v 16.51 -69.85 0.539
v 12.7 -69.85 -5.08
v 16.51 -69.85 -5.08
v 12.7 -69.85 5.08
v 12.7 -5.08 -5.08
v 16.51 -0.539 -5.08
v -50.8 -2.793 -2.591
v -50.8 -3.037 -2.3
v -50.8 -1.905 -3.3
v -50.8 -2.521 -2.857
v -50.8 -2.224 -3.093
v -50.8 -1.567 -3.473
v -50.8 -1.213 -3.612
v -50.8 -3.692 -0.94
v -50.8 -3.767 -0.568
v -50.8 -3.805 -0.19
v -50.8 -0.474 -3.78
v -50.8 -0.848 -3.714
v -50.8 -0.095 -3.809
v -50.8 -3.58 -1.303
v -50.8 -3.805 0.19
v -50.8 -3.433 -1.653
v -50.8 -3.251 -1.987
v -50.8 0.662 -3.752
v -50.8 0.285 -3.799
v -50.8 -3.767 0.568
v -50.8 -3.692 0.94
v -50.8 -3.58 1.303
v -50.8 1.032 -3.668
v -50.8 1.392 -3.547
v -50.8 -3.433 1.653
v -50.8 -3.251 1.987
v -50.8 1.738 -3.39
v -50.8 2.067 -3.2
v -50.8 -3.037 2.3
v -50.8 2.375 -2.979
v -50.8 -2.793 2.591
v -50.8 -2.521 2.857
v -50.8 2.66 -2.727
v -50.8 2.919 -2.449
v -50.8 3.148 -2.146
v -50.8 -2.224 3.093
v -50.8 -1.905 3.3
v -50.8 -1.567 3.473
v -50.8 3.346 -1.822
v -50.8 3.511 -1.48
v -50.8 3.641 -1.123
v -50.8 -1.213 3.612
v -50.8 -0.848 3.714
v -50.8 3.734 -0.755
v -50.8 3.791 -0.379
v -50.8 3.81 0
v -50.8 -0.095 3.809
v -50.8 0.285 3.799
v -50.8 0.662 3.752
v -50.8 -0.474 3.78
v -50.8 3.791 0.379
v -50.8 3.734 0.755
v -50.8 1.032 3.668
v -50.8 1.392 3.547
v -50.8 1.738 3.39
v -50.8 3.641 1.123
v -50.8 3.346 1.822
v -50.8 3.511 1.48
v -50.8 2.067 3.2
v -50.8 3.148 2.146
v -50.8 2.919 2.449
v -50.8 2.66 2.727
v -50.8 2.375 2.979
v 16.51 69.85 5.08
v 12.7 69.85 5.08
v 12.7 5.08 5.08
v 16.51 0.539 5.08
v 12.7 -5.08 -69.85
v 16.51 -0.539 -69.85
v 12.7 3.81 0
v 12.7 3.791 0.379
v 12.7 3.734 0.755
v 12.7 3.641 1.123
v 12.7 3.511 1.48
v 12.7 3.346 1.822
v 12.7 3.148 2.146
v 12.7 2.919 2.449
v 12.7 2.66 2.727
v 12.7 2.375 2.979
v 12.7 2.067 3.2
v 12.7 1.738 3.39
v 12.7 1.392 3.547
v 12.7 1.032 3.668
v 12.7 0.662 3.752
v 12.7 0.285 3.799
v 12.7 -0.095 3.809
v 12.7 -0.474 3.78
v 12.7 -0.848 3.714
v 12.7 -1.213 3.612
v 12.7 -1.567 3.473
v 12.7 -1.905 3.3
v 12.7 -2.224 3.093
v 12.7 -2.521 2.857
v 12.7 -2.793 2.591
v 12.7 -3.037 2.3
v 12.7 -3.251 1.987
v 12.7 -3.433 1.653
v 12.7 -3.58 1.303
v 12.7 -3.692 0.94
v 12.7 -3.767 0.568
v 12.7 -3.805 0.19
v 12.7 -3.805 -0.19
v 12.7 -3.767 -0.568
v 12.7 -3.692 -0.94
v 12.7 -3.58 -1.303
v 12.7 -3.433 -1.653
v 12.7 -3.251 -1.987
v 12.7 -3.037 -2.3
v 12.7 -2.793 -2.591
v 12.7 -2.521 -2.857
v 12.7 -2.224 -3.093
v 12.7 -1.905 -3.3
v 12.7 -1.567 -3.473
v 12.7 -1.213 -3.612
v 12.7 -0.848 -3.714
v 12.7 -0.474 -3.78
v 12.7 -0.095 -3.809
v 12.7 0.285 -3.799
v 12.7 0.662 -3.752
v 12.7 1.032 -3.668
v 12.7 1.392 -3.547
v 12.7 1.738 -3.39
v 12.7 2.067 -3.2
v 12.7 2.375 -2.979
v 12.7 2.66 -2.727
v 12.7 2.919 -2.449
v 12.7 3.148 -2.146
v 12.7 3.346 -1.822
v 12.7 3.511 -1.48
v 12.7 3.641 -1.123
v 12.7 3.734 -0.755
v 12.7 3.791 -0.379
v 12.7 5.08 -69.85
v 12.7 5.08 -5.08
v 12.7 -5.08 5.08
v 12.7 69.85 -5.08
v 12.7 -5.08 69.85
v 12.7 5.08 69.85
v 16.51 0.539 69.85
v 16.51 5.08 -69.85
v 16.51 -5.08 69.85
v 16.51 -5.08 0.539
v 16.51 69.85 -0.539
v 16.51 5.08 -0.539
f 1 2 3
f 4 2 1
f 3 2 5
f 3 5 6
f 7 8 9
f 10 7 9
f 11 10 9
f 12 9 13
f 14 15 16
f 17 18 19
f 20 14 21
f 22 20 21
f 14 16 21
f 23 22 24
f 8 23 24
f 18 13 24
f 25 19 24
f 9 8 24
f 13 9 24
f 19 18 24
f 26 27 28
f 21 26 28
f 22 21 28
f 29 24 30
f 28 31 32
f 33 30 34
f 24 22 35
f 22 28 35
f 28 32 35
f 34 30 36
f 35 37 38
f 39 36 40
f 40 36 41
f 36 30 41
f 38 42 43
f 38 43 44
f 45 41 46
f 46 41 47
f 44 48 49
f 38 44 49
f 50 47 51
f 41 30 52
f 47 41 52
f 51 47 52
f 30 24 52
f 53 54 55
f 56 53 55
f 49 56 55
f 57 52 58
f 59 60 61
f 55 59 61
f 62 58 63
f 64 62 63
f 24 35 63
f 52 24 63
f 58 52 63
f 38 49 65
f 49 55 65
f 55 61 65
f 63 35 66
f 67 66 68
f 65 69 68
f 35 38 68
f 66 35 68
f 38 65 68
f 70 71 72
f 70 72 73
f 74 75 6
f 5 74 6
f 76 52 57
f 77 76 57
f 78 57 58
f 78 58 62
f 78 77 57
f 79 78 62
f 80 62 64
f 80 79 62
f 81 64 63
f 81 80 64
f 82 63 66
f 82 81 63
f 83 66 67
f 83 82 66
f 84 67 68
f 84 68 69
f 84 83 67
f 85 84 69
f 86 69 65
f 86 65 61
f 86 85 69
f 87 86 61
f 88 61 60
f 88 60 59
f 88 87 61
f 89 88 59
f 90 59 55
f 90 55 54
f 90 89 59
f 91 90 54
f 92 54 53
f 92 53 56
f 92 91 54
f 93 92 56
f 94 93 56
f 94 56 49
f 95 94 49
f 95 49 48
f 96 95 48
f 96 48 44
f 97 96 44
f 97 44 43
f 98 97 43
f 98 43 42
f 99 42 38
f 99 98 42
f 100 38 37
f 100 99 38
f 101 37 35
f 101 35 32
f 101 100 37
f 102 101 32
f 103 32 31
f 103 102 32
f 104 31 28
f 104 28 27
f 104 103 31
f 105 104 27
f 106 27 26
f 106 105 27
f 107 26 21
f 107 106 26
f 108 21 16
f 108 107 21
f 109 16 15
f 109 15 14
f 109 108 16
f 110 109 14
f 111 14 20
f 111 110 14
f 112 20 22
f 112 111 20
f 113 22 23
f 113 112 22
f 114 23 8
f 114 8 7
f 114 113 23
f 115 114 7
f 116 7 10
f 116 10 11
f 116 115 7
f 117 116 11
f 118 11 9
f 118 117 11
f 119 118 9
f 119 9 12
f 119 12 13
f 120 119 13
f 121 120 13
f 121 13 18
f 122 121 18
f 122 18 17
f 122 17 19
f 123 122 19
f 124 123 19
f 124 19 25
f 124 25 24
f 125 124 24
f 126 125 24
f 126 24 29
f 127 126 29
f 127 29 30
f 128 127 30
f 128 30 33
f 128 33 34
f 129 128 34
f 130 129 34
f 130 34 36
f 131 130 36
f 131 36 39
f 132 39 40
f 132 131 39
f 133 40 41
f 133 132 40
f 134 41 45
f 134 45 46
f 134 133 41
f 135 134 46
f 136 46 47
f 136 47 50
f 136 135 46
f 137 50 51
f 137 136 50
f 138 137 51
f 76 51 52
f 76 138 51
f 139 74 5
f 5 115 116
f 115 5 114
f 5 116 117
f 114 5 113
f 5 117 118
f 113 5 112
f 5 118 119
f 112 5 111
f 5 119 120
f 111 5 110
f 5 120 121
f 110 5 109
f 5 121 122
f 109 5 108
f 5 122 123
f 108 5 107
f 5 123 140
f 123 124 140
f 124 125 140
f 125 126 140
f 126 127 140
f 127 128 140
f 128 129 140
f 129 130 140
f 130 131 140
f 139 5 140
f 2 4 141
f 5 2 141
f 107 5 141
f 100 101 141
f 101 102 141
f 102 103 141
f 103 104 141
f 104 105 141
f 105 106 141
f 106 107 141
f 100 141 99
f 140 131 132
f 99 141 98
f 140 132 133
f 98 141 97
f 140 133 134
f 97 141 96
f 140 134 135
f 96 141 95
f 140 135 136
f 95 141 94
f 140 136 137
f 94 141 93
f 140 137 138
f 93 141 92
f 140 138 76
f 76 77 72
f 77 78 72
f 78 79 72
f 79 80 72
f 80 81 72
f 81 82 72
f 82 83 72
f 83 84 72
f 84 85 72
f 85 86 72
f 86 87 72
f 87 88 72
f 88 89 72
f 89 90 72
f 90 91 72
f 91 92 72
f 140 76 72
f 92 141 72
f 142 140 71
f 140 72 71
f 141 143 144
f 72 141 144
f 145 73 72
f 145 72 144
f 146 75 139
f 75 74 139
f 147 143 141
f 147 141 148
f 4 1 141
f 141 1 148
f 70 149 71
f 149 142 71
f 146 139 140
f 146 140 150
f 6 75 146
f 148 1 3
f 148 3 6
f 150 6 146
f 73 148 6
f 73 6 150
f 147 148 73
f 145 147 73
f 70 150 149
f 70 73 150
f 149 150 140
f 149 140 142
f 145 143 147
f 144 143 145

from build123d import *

# Parameters (mm, degrees)
F0_R          = 3.81
F1_DEPTH      = 12.7
F1_DEPTH_BACK = 50.8
F2_W          = 64.77
F2_H          = 10.16
F2_W_2        = 10.16
F2_H_2        = 64.77
F3_DEPTH      = 3.81
F4_SIZE2      = 4.540571
F4_SIZE       = 3.80999
F4_2_SIZE2    = 4.540571
F4_2_SIZE     = 3.80999
F4_3_SIZE2    = 4.540571
F4_3_SIZE     = 3.80999
F4_4_SIZE2    = 4.540571
F4_4_SIZE     = 3.80999


# Not quite as in the source:
# - a fillet or chamfer is up to 0.001 mm smaller than in the source, because OpenCascade refuses the exact size


with BuildPart() as f1:
    # F0 (on Right) → F1 (new body, two sides)
    with BuildSketch(Plane.YZ) as f1_sk:
        Circle(F0_R)
    extrude(amount=F1_DEPTH)
    extrude(f1_sk.sketch, amount=-F1_DEPTH_BACK)

    # F2 (on face) → F3 (join)
    with BuildSketch(Plane.YZ.offset(12.7)):
        with Locations((37.465, 0)):
            Rectangle(F2_W, F2_H)
        Rectangle(F2_W_2, F2_H)
        with Locations((0, 37.465)):
            Rectangle(F2_W_2, F2_H_2)
        with Locations((-37.465, 0)):
            Rectangle(F2_W, F2_H)
        with Locations((0, -37.465)):
            Rectangle(F2_W_2, F2_H_2)
    extrude(amount=F3_DEPTH)

    # F4 (size 3.81 and 4.5405811878 in the source; OpenCascade refuses exactly that, so slightly less here)
    f4_edges = [f1.edges().sort_by_distance(p)[0] for p in [
        (16.51, 5.08, 37.465),
    ]]
    f4_side = f1.faces().sort_by_distance((14.605, 5.08, 37.465))[0]
    chamfer(f4_edges, length=F4_SIZE, length2=F4_SIZE2, reference=f4_side)

    # F4#2 (size 3.81 and 4.5405811878 in the source; OpenCascade refuses exactly that, so slightly less here)
    f4_2_edges = [f1.edges().sort_by_distance(p)[0] for p in [
        (16.51, 37.465, -5.08),
    ]]
    f4_2_side = f1.faces().sort_by_distance((14.605, 37.465, -5.08))[0]
    chamfer(f4_2_edges, length=F4_2_SIZE, length2=F4_2_SIZE2, reference=f4_2_side)

    # F4#3 (size 3.81 and 4.5405811878 in the source; OpenCascade refuses exactly that, so slightly less here)
    f4_3_edges = [f1.edges().sort_by_distance(p)[0] for p in [
        (16.51, -5.08, -37.465),
    ]]
    f4_3_side = f1.faces().sort_by_distance((14.605, -5.08, -37.465))[0]
    chamfer(f4_3_edges, length=F4_3_SIZE, length2=F4_3_SIZE2, reference=f4_3_side)

    # F4#4 (size 3.81 and 4.5405811878 in the source; OpenCascade refuses exactly that, so slightly less here)
    f4_4_edges = [f1.edges().sort_by_distance(p)[0] for p in [
        (16.51, -37.465, 5.08),
    ]]
    f4_4_side = f1.faces().sort_by_distance((14.605, -37.465, 5.08))[0]
    chamfer(f4_4_edges, length=F4_4_SIZE, length2=F4_4_SIZE2, reference=f4_4_side)


solid = f1.part
